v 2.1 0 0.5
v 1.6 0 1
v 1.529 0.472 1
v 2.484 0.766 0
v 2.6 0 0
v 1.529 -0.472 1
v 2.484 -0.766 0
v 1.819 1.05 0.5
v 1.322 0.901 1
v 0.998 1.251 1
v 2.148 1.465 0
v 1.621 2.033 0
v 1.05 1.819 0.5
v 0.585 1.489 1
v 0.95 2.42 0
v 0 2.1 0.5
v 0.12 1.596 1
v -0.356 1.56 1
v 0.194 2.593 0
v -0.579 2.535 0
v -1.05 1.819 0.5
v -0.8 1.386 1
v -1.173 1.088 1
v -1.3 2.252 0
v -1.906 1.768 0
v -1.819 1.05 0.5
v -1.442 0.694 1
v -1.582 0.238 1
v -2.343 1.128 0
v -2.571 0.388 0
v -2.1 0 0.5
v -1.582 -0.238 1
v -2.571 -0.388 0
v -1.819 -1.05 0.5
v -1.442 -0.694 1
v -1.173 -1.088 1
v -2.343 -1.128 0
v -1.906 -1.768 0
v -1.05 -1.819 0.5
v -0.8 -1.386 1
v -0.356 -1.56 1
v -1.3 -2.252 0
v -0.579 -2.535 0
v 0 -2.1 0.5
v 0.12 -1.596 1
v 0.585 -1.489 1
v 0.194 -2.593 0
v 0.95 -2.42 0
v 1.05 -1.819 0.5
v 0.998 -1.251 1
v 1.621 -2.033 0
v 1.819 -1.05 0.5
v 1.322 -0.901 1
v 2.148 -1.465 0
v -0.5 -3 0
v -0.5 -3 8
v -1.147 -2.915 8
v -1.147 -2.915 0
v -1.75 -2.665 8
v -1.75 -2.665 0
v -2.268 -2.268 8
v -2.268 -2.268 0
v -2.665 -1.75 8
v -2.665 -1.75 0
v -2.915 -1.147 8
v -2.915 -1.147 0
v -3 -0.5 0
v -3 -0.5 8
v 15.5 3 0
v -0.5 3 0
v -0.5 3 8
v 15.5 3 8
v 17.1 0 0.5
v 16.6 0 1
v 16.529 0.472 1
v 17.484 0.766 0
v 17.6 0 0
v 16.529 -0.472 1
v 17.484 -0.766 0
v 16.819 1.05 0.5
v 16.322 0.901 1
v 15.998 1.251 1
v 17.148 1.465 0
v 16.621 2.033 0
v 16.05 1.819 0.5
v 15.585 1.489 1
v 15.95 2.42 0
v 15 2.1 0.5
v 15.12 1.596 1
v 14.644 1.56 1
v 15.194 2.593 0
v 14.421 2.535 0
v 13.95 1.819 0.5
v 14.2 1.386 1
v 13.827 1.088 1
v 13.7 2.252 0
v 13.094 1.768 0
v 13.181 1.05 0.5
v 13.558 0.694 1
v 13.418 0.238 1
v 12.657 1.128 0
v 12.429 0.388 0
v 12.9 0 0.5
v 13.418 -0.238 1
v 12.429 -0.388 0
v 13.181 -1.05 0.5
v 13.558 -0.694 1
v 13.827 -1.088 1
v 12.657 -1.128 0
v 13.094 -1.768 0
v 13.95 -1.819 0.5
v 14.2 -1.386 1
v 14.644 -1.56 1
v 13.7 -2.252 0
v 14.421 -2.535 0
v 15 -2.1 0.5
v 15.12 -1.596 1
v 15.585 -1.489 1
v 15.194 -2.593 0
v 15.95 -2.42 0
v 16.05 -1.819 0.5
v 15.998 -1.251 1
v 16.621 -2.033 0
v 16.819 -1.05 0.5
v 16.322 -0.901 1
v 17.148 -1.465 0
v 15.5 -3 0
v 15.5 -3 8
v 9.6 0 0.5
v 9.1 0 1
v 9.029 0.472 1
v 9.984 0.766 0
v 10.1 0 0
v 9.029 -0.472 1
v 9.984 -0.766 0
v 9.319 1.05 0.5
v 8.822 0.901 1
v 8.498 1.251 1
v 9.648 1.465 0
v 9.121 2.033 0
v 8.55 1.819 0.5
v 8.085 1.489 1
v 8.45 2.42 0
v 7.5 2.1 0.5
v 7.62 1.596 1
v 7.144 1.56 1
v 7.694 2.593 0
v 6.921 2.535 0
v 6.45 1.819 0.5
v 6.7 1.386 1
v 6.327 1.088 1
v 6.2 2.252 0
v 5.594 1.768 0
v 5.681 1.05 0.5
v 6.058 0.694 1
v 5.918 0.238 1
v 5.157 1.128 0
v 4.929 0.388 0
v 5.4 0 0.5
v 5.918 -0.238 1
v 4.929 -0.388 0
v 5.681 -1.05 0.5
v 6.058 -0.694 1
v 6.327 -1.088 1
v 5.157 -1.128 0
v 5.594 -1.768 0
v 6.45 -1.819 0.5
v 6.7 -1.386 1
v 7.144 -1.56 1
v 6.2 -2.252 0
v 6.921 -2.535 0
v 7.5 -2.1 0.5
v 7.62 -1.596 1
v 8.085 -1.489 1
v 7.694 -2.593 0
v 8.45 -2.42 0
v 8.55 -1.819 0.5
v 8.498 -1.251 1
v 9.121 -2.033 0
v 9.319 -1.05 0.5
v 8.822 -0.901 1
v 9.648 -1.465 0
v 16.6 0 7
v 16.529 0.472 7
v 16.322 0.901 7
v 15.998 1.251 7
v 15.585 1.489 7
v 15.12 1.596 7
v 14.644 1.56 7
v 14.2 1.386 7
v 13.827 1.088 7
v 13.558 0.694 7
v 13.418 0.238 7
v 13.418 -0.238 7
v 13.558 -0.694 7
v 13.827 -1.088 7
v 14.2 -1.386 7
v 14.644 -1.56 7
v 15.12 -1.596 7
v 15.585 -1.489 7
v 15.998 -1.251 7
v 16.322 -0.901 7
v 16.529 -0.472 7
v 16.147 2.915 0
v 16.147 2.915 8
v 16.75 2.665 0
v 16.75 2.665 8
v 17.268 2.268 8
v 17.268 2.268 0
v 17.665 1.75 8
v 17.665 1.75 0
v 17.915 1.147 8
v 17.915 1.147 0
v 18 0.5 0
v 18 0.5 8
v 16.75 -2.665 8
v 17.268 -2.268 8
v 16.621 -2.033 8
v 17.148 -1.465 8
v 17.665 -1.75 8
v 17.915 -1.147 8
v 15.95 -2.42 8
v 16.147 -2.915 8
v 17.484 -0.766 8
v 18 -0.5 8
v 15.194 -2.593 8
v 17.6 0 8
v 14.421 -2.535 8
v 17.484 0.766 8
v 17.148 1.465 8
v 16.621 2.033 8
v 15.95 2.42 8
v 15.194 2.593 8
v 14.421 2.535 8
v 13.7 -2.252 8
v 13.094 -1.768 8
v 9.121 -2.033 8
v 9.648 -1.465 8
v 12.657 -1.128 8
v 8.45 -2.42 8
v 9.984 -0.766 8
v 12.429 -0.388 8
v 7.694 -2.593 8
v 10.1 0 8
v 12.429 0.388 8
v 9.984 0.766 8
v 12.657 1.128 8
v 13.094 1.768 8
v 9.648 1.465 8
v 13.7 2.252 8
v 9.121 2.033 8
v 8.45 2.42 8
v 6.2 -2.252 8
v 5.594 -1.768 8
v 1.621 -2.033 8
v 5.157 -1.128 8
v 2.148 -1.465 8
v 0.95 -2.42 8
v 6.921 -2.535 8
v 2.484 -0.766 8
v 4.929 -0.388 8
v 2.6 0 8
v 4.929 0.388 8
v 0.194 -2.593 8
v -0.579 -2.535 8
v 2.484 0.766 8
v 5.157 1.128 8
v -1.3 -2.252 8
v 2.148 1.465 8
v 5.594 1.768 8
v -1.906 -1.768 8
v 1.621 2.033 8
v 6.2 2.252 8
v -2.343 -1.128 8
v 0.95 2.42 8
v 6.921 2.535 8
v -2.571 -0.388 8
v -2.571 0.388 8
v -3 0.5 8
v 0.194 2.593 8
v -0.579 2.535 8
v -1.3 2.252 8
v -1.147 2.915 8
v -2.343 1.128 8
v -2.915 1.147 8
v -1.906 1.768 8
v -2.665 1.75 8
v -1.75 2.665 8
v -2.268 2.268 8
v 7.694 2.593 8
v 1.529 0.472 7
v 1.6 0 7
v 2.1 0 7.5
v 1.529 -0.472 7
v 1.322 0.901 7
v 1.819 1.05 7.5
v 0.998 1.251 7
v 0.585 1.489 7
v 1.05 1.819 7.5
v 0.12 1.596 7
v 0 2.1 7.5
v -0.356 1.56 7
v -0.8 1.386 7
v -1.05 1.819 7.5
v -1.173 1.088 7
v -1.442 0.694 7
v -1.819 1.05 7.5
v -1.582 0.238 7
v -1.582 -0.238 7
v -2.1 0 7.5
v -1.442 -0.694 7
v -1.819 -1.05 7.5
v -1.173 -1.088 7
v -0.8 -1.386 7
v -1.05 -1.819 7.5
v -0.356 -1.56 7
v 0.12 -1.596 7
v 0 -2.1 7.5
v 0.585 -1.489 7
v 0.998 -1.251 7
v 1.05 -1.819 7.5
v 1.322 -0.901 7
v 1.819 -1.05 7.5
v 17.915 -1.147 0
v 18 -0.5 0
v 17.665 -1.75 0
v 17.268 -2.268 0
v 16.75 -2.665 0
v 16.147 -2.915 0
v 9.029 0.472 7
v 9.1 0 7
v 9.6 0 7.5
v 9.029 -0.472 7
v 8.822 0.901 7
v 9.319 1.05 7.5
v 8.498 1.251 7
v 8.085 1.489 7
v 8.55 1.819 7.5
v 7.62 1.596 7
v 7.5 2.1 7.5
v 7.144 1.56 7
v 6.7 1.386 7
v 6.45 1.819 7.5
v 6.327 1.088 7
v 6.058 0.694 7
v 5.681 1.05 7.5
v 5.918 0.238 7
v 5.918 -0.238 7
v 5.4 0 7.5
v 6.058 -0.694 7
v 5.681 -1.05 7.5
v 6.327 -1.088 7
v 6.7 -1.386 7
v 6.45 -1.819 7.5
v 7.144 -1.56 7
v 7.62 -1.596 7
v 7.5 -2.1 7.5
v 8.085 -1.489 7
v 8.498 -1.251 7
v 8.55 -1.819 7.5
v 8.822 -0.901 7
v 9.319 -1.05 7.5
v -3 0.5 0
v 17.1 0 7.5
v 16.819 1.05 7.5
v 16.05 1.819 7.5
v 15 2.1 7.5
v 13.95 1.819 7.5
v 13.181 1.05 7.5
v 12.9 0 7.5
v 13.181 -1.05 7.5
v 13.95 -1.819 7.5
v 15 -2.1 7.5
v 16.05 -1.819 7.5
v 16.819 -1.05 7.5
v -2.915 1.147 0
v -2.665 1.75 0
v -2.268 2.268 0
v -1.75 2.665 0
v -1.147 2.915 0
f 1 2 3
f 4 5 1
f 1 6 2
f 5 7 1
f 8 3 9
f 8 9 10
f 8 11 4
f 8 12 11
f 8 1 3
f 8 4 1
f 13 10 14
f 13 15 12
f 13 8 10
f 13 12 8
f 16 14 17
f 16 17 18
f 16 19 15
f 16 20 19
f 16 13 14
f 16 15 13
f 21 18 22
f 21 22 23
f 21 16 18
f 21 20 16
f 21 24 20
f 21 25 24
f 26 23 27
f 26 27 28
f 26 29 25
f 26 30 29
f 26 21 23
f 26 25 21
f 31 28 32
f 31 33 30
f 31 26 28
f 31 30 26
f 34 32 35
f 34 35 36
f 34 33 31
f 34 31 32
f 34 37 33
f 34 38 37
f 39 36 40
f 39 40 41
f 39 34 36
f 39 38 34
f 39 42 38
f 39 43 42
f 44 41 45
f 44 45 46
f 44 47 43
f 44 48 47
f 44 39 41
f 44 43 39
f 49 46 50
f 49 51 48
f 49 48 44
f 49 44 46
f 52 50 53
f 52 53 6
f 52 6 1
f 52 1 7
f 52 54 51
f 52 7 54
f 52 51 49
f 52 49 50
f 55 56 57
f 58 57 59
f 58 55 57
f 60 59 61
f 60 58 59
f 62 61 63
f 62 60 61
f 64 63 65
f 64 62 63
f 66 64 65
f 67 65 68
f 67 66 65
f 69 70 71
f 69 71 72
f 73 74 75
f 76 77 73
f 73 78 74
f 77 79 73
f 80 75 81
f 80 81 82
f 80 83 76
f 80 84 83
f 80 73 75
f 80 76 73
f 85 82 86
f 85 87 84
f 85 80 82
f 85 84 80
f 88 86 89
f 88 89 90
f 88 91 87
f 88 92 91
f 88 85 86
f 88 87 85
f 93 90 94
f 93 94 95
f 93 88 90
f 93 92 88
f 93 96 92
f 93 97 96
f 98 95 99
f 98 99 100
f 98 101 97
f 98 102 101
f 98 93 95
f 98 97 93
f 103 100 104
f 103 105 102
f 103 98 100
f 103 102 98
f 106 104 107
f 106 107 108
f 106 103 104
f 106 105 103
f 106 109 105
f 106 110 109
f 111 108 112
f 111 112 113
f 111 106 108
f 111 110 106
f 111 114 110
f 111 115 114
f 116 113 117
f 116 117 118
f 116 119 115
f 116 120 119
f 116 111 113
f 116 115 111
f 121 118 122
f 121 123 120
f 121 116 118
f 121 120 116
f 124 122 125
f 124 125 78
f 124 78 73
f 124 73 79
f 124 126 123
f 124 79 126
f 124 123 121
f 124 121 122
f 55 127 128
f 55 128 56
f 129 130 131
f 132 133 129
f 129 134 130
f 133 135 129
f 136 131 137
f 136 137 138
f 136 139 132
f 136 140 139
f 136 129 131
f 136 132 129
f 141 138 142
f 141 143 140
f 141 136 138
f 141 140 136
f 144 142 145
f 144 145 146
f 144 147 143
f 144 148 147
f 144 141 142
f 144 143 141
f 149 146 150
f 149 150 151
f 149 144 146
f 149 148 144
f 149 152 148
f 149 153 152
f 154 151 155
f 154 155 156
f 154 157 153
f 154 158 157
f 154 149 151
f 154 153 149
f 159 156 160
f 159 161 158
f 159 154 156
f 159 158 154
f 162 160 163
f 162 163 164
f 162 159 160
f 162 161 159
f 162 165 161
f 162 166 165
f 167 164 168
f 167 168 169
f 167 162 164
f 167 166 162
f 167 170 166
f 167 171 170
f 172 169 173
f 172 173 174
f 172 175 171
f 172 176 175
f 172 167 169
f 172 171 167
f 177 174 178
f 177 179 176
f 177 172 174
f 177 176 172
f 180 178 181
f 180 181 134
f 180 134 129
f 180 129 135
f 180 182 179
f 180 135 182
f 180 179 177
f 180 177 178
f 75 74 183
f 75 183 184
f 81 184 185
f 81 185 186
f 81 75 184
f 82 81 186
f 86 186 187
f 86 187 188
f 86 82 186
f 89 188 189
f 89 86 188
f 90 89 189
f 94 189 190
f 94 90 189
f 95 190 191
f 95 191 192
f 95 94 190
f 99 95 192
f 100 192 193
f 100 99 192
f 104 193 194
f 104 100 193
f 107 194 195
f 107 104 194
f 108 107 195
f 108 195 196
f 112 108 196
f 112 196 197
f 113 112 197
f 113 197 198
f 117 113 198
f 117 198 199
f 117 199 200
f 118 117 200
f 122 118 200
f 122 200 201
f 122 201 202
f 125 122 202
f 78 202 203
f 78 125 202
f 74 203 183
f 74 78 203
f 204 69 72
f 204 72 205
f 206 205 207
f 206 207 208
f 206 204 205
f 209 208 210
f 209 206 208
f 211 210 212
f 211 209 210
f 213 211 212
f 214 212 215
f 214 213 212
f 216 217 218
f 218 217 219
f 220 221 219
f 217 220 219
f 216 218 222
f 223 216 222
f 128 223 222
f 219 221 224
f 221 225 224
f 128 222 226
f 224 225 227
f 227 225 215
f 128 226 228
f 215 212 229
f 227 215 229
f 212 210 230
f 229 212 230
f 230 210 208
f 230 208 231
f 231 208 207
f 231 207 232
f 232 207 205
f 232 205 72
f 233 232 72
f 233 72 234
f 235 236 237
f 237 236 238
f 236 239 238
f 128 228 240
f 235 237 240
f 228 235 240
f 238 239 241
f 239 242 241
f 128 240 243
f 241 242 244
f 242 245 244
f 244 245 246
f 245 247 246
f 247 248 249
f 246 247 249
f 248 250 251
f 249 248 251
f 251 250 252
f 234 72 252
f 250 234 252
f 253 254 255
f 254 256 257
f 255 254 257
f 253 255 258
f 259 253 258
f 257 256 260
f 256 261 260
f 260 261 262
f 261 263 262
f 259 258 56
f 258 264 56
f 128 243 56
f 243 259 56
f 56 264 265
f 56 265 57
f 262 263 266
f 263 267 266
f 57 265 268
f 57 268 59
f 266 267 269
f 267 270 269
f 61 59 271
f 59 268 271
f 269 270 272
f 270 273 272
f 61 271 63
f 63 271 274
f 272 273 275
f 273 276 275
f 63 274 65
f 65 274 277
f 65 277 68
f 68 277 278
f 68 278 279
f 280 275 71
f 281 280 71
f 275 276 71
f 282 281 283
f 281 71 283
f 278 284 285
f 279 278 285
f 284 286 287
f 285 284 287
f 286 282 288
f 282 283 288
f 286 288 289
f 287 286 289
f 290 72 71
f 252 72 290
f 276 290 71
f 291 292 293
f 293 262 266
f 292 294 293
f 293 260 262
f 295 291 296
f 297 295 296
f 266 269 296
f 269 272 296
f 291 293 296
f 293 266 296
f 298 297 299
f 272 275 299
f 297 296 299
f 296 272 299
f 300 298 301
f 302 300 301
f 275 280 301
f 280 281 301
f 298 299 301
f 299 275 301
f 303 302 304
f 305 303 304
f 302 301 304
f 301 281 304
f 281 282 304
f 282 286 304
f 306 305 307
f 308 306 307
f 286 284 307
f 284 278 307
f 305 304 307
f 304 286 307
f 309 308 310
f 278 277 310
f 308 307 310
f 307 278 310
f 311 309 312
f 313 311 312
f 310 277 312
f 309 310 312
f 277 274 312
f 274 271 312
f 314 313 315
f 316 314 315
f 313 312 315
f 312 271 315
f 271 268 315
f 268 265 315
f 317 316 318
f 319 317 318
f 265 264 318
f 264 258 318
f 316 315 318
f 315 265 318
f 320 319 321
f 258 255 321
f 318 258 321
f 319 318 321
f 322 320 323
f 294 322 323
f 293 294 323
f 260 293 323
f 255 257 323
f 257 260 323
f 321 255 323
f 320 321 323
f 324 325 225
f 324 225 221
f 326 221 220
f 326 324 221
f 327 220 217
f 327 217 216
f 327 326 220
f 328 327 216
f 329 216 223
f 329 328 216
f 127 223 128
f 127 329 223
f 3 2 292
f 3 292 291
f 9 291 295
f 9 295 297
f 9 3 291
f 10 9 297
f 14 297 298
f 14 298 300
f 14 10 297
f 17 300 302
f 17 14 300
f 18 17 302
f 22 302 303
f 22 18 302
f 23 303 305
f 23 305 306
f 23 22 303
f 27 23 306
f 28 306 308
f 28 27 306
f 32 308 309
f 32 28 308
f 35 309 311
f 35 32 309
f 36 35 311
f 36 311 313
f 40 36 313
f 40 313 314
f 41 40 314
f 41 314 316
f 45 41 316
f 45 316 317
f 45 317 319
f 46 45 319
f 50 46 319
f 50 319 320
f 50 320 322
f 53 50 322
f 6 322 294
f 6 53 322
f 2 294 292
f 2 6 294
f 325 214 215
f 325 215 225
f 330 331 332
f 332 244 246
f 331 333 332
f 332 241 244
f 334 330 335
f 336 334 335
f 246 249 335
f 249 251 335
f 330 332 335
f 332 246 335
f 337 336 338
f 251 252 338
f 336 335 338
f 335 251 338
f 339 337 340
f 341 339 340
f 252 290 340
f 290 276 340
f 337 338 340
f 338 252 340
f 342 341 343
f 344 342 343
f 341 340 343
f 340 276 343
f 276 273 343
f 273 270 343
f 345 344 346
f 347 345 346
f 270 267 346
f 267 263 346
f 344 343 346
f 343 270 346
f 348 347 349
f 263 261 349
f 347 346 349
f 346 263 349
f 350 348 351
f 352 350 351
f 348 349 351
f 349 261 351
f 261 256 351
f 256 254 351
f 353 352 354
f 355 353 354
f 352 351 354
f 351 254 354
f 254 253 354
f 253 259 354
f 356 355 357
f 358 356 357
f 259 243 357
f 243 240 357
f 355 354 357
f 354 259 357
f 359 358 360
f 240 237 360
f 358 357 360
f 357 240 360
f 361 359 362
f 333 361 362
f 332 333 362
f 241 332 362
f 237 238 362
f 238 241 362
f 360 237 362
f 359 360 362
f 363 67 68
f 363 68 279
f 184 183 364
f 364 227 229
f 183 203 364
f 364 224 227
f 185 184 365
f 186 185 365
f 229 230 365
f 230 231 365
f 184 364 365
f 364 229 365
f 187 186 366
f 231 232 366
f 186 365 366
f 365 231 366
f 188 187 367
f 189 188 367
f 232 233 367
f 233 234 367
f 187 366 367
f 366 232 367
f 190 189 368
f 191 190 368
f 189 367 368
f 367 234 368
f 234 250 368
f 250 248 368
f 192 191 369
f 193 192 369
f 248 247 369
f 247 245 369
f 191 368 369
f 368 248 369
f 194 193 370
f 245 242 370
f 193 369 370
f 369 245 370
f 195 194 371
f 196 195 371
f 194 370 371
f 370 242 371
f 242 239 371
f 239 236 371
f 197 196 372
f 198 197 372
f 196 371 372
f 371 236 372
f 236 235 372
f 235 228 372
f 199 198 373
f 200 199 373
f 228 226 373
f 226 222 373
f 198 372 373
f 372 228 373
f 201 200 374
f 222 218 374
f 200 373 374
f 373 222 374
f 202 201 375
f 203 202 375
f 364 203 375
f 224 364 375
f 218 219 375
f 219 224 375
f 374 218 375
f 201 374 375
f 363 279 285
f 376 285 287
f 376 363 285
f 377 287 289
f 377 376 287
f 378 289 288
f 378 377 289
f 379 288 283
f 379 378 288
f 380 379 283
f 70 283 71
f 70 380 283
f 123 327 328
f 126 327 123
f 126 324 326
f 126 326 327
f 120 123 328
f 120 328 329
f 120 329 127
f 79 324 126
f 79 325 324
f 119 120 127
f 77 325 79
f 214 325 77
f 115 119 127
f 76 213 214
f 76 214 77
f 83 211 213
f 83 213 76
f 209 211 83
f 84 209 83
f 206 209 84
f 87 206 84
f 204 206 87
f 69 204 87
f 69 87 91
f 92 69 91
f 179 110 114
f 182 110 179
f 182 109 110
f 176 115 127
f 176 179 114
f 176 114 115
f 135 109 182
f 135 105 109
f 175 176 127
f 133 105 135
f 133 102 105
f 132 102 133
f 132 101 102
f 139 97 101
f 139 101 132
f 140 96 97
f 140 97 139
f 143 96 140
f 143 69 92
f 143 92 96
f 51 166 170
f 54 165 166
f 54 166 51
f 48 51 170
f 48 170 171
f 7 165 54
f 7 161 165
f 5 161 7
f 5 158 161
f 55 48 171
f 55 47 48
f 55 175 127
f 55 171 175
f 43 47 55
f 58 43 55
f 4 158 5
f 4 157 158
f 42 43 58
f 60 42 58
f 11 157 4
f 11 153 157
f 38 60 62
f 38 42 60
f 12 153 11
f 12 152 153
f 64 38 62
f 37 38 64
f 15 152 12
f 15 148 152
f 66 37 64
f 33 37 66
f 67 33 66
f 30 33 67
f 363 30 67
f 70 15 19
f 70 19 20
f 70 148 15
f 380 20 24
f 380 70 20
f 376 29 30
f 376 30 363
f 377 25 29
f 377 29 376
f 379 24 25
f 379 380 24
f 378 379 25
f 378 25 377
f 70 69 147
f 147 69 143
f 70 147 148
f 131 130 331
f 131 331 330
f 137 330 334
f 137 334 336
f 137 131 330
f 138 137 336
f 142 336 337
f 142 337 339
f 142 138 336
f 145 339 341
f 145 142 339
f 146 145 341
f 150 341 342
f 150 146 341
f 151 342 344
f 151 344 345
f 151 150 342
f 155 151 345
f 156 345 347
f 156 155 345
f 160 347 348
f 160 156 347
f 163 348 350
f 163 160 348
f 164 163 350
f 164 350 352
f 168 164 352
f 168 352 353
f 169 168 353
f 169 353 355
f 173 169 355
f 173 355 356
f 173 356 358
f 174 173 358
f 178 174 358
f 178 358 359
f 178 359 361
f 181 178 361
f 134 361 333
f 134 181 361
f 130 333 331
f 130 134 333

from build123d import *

# Parameters (mm, degrees)
SKETCH1_R           = 1.6
BOSS_EXTRUDE1_DEPTH = 8
CHAMFER1_SIZE       = 1


with BuildPart() as part:
    # Sketch1 → Boss-Extrude1 (new body)
    with BuildSketch(Plane.XY):
        with BuildLine():
            Line((-0.5, 3), (15.5, 3))
            ThreePointArc((15.5, 3), (17.267766953, 2.267766953), (18, 0.5))
            Line((18, 0.5), (18, -0.5))
            ThreePointArc((18, -0.5), (17.267766953, -2.267766953), (15.5, -3))
            Line((15.5, -3), (-0.5, -3))
            ThreePointArc((-0.5, -3), (-2.267766953, -2.267766953), (-3, -0.5))
            Line((-3, -0.5), (-3, 0.5))
            ThreePointArc((-3, 0.5), (-2.267766953, 2.267766953), (-0.5, 3))
        make_face()
        Circle(SKETCH1_R, mode=Mode.SUBTRACT)
        with Locations((7.5, 0)):
            Circle(SKETCH1_R, mode=Mode.SUBTRACT)
        with Locations((15, 0)):
            Circle(SKETCH1_R, mode=Mode.SUBTRACT)
    extrude(amount=BOSS_EXTRUDE1_DEPTH)

    # Chamfer1
    chamfer1_edges = [part.edges().sort_by_distance(p)[0] for p in [
        (-1.6, 0, 0),
        (-1.6, 0, 8),
        (5.9, 0, 0),
        (5.9, 0, 8),
        (13.4, 0, 0),
        (13.4, 0, 8),
    ]]
    chamfer(chamfer1_edges, length=CHAMFER1_SIZE)


solid = part.part
